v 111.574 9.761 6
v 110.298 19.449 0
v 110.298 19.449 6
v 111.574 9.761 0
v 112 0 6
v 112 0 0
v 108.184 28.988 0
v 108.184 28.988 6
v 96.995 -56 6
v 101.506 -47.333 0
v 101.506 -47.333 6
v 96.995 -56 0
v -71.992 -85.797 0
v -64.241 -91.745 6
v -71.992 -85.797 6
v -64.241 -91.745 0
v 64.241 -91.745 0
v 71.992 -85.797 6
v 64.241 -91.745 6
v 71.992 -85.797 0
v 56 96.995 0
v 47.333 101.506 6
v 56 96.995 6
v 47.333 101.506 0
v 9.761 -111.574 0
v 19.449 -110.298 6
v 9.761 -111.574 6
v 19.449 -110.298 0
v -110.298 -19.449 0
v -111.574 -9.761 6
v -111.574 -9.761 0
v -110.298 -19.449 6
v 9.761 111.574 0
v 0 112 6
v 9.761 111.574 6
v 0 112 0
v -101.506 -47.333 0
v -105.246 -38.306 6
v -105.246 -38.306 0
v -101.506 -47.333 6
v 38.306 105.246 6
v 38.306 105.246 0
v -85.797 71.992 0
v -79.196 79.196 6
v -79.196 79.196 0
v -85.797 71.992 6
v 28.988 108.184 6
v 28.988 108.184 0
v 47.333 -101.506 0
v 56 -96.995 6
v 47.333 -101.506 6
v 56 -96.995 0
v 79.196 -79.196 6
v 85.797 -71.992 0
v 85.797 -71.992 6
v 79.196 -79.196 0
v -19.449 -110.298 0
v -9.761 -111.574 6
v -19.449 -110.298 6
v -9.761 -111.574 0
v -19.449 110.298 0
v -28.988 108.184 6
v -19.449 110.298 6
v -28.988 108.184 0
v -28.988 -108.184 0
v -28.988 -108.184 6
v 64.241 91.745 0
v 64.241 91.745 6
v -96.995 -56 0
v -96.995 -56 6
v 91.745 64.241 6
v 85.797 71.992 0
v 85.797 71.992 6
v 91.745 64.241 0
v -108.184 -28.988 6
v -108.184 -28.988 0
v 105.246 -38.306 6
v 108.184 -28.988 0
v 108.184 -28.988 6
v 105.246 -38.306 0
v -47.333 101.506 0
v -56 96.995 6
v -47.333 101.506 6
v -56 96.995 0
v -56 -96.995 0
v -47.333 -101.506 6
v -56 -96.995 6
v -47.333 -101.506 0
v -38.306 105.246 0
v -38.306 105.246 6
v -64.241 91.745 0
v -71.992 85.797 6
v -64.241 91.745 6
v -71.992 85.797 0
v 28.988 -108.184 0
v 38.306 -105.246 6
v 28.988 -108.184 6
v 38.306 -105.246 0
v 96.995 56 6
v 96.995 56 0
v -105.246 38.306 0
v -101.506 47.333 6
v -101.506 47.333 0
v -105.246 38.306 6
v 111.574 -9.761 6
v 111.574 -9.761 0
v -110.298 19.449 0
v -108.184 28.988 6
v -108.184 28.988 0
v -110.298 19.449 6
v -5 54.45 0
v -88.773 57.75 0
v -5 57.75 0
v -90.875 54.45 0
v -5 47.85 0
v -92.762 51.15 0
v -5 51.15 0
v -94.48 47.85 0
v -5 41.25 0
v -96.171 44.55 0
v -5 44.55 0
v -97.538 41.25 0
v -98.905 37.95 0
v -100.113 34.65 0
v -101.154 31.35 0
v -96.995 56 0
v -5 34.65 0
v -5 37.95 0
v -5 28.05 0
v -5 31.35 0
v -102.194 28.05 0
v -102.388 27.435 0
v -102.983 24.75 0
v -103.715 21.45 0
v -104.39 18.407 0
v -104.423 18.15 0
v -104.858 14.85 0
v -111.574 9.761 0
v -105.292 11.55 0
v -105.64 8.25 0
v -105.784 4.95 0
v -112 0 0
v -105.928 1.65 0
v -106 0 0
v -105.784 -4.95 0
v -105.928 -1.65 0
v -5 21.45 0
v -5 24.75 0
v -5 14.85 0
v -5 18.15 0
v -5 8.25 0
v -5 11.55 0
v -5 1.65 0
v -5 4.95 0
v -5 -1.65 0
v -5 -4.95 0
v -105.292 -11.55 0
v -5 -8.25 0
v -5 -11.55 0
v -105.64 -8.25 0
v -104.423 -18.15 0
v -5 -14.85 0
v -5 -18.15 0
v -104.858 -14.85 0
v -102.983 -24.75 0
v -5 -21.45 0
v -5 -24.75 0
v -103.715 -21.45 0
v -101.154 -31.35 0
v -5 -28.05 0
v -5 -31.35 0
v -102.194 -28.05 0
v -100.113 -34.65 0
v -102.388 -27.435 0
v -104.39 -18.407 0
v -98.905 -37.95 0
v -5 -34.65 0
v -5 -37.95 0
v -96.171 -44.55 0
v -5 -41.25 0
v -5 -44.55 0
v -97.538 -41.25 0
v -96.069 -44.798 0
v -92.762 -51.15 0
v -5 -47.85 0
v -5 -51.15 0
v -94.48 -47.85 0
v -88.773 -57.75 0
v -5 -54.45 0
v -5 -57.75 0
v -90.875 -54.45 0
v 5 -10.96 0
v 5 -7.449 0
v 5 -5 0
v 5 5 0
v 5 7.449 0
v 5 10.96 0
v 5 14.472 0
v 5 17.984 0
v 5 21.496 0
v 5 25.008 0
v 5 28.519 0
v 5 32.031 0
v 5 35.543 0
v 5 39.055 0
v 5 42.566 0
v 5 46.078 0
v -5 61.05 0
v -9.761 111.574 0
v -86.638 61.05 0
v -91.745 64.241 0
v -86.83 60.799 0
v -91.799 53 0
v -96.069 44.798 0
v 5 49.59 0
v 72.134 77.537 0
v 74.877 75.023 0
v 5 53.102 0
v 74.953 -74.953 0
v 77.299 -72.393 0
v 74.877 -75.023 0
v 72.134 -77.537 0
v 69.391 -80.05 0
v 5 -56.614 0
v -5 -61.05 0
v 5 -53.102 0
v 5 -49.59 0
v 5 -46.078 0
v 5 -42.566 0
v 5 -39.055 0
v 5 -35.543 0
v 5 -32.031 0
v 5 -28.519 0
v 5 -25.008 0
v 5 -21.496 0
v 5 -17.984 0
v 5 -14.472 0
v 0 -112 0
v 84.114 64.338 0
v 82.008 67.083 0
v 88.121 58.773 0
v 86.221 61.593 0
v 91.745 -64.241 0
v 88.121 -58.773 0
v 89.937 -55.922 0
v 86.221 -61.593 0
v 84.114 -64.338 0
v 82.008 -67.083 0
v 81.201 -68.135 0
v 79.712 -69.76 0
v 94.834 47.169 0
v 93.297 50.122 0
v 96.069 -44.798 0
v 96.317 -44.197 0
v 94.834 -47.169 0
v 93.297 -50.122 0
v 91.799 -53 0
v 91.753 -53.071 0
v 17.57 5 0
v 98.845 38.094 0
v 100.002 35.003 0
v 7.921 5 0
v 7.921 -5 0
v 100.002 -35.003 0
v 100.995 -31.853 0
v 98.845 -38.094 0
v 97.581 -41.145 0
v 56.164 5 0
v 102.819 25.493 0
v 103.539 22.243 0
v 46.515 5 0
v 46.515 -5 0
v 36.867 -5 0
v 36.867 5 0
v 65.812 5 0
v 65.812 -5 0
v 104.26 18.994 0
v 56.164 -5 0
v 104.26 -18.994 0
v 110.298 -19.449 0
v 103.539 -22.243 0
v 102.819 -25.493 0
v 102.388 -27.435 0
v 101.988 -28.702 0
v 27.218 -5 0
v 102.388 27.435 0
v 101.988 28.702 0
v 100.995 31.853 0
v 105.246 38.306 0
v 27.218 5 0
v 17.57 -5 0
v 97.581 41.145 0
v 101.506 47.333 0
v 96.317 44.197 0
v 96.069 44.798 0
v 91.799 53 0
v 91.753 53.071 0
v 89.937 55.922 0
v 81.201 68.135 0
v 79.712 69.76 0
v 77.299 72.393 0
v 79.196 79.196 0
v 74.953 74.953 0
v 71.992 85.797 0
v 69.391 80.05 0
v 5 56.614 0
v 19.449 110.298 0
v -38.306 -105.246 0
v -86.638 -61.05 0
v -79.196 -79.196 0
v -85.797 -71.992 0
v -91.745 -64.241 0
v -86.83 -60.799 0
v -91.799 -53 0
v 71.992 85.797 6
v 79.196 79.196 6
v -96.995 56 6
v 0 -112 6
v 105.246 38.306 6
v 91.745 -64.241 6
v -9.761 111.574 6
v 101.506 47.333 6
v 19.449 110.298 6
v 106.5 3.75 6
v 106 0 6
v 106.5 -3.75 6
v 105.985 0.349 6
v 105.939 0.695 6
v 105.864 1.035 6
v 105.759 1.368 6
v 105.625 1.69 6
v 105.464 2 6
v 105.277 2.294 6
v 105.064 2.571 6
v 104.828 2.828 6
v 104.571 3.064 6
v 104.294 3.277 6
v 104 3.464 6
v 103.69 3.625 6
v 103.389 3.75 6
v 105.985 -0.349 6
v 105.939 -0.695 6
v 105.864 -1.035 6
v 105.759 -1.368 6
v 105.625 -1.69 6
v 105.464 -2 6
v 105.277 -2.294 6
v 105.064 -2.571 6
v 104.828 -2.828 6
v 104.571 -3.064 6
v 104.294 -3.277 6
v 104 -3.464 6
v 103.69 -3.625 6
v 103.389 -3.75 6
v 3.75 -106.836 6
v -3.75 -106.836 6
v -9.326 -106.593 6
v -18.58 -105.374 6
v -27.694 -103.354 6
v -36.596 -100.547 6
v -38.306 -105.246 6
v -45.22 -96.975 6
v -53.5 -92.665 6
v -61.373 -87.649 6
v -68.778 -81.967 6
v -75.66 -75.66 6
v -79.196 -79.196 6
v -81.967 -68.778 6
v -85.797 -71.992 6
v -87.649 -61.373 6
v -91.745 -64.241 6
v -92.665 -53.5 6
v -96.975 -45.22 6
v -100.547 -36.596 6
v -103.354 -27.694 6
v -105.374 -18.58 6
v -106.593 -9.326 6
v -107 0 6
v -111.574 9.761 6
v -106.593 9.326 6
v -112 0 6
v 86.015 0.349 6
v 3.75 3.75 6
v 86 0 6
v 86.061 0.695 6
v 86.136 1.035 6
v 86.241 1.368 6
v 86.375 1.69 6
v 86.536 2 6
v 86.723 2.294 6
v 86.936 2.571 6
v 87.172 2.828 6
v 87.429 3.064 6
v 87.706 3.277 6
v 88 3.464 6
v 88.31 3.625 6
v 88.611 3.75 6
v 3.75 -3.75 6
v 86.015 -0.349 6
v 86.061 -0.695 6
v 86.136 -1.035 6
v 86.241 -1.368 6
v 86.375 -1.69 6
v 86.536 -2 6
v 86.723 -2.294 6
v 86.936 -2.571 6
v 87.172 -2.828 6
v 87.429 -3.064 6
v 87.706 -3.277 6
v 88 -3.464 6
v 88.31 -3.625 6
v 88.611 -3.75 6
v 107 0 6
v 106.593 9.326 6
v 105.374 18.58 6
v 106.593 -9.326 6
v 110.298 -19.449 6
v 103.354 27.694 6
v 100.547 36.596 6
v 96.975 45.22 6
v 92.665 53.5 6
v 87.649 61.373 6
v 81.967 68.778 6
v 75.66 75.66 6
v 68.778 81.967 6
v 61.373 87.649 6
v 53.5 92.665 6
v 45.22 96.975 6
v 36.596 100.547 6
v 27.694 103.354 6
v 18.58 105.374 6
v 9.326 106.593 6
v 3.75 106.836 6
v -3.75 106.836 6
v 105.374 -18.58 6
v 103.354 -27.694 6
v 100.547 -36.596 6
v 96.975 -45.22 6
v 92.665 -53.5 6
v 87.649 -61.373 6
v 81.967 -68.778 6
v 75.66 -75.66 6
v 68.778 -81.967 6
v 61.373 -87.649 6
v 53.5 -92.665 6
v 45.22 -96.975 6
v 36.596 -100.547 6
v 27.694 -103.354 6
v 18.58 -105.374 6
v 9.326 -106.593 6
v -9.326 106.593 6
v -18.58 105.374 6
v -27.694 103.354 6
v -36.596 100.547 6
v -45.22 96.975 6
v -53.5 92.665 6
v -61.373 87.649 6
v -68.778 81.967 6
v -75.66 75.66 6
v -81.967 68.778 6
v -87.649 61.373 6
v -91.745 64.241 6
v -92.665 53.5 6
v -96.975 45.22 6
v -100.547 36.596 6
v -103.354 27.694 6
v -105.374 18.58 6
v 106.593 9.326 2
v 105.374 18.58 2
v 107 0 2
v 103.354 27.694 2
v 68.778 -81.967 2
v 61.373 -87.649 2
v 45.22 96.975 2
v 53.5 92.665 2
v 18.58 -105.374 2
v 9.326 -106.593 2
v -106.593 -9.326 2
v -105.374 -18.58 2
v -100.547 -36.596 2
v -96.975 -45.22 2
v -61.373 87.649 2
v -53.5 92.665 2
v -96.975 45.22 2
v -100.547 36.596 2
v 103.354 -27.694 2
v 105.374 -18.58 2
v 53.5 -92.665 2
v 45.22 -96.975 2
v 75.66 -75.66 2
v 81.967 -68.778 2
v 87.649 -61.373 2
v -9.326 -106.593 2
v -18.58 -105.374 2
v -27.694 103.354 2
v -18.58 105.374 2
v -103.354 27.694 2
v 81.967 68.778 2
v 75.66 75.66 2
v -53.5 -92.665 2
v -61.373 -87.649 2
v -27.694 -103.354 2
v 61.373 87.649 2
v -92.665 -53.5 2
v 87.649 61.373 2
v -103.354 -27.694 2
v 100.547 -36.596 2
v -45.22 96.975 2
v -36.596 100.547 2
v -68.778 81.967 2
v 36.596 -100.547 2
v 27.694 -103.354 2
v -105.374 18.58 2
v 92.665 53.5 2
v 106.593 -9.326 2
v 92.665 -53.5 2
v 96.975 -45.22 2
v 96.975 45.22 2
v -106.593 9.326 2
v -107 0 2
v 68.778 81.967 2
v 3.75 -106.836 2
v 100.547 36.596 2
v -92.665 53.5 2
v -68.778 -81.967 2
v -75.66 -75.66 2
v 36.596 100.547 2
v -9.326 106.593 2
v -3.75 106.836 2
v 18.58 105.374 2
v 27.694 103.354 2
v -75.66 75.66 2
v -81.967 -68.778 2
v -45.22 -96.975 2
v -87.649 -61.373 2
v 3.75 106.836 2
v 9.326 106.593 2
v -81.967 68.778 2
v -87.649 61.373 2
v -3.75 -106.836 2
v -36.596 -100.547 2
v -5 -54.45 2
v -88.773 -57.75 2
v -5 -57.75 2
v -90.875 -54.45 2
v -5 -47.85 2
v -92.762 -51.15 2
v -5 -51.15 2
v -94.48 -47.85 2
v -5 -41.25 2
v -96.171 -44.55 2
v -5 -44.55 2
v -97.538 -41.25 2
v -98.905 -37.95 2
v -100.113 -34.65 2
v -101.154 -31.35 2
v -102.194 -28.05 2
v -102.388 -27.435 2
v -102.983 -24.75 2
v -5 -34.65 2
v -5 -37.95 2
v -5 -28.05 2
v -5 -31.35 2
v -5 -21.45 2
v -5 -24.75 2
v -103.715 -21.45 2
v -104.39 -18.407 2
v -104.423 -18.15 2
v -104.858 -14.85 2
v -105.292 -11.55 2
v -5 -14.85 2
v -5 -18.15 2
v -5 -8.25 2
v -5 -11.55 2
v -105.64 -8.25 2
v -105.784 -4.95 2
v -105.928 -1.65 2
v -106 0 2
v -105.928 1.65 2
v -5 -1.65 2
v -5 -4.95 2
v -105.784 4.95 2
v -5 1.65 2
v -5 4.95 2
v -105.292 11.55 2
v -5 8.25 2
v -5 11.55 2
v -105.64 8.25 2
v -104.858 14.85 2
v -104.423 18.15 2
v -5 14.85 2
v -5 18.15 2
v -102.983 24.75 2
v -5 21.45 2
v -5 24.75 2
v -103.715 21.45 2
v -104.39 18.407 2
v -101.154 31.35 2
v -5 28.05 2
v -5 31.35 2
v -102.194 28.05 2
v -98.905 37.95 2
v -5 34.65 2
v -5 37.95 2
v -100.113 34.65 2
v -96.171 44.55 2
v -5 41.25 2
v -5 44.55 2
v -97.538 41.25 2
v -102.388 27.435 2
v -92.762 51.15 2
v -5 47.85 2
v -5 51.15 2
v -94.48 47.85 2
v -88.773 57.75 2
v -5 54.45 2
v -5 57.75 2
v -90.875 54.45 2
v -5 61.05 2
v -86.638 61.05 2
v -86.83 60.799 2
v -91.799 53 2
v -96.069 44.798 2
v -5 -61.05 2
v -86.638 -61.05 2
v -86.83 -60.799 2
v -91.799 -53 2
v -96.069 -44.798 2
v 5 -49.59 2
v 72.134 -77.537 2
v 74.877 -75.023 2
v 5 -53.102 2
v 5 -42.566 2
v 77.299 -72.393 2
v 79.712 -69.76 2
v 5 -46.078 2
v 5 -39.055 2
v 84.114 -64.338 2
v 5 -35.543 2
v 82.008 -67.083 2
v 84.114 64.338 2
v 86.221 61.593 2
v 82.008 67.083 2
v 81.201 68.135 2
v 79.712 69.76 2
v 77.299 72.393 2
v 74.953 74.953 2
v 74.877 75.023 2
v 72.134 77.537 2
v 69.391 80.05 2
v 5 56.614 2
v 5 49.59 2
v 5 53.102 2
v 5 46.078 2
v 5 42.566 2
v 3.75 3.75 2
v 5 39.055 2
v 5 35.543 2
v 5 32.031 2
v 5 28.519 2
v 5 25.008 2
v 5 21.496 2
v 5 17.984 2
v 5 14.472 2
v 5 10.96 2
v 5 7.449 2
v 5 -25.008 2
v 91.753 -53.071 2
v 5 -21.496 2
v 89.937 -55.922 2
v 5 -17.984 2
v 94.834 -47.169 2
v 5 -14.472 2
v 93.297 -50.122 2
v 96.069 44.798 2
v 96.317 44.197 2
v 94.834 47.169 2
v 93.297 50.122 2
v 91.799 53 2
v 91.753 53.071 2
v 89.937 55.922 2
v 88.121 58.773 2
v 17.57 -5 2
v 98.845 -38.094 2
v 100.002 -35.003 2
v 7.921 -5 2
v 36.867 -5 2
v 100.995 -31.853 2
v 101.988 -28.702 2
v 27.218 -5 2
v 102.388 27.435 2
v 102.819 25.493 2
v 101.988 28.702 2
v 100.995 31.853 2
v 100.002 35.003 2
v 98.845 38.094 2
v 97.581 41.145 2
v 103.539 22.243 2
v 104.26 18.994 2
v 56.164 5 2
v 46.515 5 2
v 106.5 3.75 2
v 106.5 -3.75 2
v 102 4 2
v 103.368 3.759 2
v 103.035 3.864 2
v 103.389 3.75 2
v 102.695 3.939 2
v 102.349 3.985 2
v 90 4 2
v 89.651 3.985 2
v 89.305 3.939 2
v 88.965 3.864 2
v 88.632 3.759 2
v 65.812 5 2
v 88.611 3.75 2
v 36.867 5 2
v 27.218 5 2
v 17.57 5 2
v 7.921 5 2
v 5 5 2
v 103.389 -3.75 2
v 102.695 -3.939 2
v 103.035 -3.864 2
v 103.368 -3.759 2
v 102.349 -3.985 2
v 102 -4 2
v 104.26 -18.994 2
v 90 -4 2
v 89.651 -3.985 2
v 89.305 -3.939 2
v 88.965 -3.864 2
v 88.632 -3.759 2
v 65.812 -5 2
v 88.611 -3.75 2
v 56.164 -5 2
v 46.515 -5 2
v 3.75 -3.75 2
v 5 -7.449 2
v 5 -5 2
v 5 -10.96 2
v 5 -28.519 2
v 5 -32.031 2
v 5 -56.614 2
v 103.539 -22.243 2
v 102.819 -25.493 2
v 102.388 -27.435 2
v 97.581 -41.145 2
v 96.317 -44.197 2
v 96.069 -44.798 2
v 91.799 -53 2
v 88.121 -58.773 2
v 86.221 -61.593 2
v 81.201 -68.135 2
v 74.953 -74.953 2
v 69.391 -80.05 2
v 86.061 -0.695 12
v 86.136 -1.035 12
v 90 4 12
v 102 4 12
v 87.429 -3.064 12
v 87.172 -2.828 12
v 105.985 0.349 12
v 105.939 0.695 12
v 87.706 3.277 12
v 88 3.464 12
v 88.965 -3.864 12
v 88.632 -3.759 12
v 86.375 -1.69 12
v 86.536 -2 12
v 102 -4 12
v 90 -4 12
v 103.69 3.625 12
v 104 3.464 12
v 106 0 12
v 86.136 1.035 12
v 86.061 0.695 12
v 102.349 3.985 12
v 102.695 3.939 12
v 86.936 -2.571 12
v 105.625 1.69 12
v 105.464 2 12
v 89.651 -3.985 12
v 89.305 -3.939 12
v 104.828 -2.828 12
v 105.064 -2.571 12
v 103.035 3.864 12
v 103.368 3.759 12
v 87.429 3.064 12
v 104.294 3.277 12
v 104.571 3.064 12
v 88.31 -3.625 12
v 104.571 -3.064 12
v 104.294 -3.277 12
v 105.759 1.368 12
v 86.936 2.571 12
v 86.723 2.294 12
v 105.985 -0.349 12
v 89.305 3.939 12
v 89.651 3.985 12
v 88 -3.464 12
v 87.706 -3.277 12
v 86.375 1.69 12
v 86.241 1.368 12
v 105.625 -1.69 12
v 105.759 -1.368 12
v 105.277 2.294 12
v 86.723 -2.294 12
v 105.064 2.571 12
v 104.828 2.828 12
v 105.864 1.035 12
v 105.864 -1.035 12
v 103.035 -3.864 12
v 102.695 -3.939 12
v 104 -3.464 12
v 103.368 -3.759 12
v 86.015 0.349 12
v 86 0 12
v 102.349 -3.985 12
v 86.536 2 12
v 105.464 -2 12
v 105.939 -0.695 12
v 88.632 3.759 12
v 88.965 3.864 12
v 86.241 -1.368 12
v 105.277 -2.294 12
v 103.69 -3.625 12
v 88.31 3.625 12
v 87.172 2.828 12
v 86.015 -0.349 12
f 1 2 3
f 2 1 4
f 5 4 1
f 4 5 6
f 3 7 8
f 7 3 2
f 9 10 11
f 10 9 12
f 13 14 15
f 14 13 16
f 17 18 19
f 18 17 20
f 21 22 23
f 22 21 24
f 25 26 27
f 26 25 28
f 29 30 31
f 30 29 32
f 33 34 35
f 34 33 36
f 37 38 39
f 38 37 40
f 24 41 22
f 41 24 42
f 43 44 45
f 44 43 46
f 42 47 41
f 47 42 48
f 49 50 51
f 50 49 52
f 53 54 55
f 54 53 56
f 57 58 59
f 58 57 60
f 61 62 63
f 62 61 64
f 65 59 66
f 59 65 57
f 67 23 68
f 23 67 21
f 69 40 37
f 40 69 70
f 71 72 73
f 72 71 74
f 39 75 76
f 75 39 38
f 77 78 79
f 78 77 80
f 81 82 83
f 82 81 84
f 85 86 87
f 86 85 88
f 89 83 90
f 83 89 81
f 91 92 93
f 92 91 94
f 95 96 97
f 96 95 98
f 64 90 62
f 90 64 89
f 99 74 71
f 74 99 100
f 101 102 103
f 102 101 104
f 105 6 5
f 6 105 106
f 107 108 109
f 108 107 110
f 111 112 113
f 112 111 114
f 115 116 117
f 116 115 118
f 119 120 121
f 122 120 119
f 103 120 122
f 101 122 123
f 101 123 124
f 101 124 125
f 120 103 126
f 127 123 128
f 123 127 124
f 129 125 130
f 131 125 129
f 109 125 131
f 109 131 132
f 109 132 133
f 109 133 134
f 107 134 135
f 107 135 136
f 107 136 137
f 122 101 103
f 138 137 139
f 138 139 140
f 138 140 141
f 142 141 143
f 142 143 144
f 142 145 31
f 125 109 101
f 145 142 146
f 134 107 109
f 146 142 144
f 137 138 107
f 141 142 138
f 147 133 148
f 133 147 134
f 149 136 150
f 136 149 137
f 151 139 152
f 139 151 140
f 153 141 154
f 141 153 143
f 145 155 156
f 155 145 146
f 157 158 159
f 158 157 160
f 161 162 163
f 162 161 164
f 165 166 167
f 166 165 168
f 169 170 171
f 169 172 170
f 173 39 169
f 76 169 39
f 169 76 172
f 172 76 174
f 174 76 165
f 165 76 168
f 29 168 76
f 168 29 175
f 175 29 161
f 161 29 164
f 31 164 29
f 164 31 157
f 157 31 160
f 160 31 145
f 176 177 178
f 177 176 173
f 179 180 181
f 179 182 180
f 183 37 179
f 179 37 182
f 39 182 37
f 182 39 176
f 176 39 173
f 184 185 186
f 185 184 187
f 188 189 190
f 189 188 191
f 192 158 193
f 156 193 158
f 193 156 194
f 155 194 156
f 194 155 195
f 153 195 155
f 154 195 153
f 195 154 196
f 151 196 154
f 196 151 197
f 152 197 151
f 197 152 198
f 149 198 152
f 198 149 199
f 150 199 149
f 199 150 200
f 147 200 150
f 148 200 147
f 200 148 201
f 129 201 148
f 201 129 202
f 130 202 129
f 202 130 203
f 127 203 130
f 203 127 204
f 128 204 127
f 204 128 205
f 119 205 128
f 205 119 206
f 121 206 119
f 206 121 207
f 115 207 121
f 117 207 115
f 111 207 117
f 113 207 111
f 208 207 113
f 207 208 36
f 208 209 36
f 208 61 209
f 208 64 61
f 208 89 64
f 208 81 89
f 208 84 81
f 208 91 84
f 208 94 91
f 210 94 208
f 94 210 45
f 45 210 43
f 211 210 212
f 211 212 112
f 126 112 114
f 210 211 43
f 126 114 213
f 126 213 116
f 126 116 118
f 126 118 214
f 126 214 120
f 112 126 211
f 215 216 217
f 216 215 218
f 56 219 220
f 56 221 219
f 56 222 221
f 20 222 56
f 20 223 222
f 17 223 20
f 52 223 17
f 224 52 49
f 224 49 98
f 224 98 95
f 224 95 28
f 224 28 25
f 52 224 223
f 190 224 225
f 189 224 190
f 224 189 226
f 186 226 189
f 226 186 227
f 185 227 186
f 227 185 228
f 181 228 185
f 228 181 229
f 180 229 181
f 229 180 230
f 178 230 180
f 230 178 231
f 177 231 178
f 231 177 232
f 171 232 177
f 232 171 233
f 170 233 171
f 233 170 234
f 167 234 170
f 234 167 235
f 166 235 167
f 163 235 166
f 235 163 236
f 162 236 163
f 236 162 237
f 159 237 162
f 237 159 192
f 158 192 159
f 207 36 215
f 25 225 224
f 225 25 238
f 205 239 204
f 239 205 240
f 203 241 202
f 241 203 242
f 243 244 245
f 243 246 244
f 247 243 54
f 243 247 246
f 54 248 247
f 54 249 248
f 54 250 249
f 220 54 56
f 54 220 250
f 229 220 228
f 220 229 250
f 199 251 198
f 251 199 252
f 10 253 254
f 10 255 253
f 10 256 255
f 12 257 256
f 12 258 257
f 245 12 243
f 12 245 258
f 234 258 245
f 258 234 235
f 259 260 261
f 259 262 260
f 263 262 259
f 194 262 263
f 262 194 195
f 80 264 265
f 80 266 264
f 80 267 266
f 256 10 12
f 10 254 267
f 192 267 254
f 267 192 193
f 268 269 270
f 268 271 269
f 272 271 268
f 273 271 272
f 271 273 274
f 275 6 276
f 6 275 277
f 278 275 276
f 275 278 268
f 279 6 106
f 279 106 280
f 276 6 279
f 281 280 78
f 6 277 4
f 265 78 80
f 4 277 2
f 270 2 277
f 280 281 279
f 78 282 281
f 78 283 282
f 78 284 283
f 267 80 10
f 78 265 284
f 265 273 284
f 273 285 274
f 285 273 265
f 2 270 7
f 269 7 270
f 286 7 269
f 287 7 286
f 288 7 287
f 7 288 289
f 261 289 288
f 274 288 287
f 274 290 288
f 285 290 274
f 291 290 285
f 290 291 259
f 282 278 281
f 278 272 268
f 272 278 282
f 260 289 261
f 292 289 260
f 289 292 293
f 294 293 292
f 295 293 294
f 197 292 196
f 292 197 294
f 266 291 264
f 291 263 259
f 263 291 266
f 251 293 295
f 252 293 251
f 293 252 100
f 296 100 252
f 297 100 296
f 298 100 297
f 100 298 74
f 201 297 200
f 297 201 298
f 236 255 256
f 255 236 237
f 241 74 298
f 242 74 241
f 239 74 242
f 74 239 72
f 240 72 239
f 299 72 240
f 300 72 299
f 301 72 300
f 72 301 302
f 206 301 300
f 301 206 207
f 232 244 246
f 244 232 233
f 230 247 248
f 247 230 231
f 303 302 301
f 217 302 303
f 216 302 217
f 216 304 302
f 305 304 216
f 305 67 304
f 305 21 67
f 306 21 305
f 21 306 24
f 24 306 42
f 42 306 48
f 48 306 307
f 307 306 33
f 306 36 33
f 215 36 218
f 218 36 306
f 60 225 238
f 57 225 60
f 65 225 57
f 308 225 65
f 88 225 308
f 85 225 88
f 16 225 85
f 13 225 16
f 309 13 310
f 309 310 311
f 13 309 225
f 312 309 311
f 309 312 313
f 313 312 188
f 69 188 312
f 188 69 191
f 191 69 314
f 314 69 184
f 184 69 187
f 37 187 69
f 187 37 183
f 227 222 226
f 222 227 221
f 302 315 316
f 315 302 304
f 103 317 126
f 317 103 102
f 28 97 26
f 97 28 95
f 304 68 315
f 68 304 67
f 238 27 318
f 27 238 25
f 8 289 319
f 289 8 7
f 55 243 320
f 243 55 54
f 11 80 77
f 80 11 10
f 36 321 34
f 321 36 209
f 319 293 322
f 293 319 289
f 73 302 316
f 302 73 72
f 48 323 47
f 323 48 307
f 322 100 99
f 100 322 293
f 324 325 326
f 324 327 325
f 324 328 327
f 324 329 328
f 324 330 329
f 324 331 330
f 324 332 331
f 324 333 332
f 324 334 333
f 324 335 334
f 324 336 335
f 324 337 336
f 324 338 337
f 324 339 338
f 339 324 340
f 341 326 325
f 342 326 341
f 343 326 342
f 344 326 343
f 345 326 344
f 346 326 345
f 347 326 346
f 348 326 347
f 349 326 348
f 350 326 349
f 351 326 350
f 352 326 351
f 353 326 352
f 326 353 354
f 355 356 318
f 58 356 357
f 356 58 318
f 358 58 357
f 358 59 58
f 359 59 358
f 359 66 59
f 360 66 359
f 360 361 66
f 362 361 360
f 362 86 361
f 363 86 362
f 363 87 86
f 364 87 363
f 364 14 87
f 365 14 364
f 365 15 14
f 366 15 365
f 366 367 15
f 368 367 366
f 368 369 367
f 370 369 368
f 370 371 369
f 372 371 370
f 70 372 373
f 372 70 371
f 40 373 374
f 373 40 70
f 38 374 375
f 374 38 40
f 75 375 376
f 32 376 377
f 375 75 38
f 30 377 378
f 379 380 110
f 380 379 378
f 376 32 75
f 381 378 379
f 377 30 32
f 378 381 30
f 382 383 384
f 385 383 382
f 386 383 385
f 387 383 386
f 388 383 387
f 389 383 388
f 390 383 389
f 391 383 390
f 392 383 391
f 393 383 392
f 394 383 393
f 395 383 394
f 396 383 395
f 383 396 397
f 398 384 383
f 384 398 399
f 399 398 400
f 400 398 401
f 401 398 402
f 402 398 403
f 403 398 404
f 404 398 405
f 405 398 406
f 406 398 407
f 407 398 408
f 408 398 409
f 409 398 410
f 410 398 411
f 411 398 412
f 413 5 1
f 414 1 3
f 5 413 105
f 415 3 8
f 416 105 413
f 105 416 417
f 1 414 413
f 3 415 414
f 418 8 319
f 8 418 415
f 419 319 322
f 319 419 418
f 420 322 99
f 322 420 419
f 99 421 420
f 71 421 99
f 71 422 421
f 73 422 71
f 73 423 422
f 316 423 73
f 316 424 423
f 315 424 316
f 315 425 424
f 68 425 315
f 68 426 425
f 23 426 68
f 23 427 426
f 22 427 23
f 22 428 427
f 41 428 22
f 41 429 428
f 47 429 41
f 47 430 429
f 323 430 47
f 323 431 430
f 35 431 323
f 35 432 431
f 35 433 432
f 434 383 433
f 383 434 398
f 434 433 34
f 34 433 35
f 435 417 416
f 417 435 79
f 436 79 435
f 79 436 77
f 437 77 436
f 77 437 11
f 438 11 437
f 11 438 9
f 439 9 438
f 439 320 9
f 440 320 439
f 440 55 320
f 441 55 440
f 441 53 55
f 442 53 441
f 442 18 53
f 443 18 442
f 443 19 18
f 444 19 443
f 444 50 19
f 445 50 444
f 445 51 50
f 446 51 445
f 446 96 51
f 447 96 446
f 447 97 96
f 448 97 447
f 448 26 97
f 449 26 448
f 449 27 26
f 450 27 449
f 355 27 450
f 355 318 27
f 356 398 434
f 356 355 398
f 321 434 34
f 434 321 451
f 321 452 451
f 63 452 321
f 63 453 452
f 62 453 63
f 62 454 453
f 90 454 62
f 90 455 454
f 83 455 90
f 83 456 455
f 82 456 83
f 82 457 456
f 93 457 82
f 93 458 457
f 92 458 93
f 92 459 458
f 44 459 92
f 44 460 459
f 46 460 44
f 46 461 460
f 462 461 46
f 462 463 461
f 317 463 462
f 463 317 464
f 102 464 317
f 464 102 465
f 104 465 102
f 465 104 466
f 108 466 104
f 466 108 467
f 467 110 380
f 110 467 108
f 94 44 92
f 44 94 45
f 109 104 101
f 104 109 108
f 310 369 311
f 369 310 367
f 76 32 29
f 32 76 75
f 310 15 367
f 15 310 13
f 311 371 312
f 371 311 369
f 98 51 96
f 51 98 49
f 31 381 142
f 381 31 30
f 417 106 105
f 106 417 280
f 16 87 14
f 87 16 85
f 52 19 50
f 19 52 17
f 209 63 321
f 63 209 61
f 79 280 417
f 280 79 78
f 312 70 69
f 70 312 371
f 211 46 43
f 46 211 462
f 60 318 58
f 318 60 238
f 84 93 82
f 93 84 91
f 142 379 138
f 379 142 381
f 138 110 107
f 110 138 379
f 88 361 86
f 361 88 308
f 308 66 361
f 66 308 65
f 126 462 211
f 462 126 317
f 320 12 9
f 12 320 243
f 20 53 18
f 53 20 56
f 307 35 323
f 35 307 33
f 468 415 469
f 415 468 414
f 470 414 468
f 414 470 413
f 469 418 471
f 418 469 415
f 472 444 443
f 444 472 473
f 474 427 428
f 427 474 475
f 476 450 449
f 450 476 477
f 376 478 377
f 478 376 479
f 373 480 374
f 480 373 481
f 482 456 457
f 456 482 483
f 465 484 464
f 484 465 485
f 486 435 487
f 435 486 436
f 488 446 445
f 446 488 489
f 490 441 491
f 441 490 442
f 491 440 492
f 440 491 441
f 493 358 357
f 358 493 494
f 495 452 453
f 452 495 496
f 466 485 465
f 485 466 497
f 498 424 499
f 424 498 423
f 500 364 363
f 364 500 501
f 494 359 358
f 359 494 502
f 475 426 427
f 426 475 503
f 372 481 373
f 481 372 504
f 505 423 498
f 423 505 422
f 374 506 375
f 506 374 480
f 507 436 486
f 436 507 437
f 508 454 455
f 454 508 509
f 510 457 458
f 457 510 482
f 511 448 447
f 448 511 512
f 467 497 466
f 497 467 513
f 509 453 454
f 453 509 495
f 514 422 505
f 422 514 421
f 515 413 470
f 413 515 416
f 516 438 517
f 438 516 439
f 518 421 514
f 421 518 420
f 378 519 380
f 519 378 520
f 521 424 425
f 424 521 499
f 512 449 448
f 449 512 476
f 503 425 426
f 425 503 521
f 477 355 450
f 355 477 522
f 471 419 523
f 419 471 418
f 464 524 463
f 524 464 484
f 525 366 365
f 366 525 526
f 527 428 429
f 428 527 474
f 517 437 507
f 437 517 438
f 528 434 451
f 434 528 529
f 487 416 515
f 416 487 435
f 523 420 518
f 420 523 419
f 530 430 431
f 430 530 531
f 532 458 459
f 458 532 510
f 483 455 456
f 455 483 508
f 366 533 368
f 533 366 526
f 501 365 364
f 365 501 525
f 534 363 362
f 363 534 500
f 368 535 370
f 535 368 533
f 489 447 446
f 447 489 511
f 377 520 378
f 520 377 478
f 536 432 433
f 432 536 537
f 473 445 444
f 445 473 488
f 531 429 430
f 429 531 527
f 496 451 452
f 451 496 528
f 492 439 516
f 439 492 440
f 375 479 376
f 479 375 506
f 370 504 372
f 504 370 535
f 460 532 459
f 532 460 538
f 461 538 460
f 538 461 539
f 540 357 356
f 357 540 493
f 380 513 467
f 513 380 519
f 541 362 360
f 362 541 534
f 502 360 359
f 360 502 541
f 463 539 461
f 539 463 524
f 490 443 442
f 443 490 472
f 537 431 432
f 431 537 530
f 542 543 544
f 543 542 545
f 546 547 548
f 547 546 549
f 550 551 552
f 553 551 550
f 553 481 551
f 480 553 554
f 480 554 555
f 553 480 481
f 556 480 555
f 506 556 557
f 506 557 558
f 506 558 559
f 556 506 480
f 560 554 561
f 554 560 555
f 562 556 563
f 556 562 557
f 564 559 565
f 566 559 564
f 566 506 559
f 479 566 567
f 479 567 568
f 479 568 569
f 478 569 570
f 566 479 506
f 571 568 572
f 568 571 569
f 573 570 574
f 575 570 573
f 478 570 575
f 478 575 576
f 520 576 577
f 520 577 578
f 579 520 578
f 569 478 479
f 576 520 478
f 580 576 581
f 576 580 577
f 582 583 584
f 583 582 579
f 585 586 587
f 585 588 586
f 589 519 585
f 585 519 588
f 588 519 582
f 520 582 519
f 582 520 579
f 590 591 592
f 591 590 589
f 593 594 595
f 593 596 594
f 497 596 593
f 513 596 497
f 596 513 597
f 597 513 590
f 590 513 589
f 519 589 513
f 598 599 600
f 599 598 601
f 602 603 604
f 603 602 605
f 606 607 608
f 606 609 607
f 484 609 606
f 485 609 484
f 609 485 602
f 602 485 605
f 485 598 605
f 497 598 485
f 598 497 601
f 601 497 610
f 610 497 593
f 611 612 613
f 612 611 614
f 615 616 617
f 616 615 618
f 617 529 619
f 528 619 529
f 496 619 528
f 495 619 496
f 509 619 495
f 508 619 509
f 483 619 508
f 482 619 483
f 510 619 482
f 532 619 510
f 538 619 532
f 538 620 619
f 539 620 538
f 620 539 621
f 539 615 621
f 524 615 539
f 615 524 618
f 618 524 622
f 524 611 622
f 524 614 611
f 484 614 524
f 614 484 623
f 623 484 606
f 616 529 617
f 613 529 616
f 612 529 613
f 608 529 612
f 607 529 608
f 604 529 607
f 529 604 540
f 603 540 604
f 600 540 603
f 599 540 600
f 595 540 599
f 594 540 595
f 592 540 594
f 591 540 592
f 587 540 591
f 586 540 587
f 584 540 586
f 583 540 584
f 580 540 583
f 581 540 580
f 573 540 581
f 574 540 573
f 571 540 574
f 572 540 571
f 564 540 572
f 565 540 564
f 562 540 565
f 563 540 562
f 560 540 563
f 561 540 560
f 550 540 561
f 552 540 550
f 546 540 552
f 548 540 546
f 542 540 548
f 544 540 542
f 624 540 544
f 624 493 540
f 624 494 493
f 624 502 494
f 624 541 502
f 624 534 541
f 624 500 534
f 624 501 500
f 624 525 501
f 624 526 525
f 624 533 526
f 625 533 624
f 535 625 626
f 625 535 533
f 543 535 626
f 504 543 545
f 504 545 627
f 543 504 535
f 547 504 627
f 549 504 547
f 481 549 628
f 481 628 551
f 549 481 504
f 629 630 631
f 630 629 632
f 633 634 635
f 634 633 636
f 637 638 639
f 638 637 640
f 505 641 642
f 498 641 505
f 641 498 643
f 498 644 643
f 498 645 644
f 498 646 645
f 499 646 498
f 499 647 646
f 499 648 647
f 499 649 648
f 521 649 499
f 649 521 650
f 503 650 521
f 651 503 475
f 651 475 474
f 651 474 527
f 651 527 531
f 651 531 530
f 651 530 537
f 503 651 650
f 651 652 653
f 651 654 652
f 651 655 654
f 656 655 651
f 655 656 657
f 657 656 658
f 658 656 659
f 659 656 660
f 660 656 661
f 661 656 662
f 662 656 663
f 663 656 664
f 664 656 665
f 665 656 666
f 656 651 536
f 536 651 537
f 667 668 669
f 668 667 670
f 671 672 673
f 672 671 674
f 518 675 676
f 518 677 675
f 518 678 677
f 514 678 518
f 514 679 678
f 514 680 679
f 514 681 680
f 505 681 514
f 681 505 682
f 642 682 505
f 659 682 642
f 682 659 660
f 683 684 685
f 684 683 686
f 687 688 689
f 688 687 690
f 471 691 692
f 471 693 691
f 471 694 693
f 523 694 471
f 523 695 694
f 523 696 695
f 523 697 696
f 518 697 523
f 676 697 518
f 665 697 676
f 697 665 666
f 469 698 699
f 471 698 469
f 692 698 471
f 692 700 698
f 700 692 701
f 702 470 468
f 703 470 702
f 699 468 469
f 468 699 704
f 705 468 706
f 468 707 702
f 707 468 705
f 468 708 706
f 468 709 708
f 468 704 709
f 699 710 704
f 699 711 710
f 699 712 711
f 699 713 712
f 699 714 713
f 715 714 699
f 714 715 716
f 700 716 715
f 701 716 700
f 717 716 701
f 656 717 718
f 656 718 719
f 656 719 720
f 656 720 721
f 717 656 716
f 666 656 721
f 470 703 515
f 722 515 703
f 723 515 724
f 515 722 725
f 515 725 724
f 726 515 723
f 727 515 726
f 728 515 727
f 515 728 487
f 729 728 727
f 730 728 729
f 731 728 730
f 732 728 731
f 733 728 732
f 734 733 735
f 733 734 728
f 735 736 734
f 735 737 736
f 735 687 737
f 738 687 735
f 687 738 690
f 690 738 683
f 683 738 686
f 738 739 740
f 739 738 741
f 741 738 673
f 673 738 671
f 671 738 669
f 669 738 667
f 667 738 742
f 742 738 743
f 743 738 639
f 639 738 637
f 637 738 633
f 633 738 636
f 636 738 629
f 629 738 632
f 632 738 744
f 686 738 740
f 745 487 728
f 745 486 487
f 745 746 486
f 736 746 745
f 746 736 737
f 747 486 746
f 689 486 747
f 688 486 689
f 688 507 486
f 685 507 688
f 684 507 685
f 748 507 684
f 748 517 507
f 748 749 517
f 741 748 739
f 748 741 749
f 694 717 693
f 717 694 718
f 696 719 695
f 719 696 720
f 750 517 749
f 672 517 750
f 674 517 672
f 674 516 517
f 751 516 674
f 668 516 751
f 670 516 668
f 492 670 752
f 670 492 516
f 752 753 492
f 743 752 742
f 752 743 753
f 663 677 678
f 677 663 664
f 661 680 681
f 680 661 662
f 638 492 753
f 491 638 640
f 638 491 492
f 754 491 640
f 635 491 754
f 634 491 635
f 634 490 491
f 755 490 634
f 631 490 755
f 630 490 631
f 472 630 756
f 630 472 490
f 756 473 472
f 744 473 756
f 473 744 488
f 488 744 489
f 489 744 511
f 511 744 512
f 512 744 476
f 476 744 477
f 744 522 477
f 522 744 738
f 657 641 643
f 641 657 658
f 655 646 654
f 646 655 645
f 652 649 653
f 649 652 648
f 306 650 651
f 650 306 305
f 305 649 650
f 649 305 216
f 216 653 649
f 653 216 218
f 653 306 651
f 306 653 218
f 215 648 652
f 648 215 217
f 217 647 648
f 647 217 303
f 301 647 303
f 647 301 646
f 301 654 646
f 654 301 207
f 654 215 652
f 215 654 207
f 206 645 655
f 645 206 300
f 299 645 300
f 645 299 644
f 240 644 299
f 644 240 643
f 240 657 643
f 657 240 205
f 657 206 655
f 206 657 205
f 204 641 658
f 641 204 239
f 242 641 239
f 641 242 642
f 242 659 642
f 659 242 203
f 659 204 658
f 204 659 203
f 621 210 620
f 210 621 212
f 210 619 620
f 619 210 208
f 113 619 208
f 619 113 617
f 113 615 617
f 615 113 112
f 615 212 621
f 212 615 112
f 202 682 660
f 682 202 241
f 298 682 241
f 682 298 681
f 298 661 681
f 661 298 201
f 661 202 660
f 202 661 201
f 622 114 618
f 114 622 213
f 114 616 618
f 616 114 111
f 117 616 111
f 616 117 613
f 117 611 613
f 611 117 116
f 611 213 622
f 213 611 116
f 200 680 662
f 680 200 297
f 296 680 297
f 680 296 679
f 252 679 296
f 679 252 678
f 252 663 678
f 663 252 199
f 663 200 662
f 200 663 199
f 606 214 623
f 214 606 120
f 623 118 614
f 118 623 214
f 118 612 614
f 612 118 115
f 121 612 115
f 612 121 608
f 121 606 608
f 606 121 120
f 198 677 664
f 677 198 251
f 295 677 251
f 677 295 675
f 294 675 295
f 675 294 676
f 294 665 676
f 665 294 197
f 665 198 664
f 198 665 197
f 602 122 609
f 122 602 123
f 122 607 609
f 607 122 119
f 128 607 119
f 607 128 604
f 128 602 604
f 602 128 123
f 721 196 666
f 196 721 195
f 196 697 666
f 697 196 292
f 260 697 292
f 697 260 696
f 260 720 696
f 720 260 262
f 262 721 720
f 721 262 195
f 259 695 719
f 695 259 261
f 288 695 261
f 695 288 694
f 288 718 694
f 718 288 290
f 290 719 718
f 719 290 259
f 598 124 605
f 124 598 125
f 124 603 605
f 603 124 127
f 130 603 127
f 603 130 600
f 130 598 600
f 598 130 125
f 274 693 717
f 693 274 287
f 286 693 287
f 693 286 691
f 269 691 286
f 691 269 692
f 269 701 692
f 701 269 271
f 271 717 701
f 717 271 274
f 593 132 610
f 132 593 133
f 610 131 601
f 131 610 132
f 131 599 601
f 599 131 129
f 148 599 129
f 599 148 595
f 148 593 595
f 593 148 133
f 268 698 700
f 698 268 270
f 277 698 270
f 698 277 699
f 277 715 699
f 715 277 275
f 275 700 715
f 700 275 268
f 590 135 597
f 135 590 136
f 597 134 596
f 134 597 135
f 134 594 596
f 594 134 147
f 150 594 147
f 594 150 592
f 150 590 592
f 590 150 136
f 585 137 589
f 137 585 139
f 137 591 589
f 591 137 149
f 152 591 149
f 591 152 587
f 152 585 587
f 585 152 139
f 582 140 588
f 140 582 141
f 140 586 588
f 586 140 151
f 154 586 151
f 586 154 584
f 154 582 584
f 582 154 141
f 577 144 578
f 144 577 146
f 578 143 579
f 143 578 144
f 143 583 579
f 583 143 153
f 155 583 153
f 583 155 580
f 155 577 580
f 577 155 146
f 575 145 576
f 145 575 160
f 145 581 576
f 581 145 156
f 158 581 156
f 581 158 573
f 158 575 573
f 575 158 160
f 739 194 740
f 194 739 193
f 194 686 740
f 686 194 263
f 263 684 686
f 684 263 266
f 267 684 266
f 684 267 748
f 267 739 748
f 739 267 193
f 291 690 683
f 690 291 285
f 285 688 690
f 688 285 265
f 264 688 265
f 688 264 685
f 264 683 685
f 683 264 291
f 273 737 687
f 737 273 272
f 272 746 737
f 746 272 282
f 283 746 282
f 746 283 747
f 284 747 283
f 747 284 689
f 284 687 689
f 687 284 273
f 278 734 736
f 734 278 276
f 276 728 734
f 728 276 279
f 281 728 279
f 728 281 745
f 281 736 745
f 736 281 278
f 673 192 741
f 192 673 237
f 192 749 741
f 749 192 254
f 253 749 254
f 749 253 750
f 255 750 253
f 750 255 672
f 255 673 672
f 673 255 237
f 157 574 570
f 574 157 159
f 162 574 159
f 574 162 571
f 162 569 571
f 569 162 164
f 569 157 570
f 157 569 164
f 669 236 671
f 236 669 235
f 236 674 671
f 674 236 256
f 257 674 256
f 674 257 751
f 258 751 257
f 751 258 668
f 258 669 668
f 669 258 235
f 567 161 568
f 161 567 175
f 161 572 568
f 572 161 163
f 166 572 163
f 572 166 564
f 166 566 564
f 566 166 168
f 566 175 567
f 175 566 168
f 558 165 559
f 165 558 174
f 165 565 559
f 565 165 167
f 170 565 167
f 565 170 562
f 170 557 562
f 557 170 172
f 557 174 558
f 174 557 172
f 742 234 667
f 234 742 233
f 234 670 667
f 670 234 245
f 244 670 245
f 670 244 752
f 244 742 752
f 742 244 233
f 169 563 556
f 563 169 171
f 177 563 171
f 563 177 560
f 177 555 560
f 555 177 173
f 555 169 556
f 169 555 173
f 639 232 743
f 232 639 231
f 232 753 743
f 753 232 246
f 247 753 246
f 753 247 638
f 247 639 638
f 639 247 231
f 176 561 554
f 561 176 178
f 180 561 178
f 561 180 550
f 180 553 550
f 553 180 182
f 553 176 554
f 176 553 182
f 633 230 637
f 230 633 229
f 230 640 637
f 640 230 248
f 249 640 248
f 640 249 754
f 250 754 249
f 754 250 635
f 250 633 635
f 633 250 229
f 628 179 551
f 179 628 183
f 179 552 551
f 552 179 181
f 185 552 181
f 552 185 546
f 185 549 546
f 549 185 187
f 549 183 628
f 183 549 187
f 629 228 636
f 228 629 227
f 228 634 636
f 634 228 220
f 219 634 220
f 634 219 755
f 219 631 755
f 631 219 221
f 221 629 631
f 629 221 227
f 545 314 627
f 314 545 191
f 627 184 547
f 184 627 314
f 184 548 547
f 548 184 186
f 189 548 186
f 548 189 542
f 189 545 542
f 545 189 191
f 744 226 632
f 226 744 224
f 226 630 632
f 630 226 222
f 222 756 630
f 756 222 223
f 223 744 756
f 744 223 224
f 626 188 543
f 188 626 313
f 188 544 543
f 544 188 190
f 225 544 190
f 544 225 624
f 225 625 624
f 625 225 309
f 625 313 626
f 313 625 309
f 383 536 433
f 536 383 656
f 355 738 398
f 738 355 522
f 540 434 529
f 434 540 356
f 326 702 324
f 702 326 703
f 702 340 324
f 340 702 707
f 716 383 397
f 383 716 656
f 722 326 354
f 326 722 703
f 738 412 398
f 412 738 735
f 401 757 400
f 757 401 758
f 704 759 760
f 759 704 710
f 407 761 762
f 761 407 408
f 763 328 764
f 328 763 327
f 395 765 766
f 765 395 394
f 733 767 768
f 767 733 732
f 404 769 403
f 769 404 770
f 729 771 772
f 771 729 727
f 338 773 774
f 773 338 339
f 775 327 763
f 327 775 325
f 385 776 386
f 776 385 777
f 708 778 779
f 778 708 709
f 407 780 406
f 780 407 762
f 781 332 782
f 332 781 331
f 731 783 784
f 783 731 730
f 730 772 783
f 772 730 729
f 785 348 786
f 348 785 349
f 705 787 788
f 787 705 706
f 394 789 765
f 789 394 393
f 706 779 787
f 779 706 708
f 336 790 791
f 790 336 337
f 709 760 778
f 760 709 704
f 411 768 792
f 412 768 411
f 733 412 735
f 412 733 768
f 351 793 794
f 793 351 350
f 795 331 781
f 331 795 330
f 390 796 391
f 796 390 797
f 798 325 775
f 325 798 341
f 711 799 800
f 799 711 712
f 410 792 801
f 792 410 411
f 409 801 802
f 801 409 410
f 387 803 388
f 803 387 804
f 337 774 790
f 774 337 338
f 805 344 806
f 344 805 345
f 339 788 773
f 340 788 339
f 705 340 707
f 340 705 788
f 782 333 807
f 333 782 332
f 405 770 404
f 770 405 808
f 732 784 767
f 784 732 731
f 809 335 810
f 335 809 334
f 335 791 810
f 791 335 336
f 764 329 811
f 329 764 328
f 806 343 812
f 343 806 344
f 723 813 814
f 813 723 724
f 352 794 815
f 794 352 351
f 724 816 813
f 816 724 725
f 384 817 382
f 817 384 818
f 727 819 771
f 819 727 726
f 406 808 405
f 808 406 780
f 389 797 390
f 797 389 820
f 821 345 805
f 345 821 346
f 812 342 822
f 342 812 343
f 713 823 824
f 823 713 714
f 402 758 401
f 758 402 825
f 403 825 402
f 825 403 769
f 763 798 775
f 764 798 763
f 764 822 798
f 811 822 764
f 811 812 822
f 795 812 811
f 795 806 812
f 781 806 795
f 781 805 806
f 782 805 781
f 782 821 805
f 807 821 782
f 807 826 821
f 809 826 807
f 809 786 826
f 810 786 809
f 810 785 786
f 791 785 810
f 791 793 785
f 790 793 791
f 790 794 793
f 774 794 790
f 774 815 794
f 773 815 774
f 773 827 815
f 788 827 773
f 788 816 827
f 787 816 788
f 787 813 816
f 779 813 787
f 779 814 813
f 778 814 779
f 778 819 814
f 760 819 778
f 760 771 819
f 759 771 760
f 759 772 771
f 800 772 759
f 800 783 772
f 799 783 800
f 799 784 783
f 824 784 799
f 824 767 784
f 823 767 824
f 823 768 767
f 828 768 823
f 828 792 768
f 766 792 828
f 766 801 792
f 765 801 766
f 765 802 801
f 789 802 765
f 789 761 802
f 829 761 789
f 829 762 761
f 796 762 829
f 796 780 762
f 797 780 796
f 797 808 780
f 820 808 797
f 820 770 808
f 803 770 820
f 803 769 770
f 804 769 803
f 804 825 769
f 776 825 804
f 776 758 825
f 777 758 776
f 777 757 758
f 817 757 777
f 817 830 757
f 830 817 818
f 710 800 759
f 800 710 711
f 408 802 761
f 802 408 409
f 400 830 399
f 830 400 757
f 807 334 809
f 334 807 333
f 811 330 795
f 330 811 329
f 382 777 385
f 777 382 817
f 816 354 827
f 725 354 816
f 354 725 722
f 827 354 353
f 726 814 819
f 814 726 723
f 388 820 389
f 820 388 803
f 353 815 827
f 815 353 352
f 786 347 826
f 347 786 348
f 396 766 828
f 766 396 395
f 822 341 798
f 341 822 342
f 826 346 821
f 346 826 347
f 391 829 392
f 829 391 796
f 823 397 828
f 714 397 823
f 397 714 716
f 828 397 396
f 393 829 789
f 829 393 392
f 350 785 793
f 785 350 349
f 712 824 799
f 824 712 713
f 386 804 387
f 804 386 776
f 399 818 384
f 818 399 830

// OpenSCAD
/*                                                 -*- c++ -*-
 * A Bahtinov mask generator.
 * Units in mm, default values are for
 * an 8 inch Newtonian
 *
 * Copyright 2013-2014, Brent Burton
 * License: CC-BY-SA
 *
 * Based on version updated: 2014-06-23
 *
 * Further modifications by Egil Kvaleberg
 * Latest update: 2014-01-26
 */

// Number of sections to split the mask in
sections = 0; // [1,2,4]

// Print which section, max is sections-1
section = 0; // [0,1,2,3]

// The overall diameter of the mask.
outerDiameter = 224.0; //

// The telescope light path diameter.
aperture = 212.0; // should be less than outerDiameter

// Diameter of secondary mirror holder. If no secondary, set to 0.
centerHoleDiameter = 0; // 

// Width of the bars.
gap = 3.3; // 3.3 is for 1000mm focal length; 4.0 for 1200mm; 6.0 for 2000mm

// Angle of bars
angle = 20; // 20 degrees is the standard value

// Maximum number of bars
maxBars = 10; // 

// Width of the strengthening bars.
bar = 10.0; 

// Height of gap mask
mHeight = 2.0;  // 

// Height of strengthening bars
bHeight = 6.0; // 

// Extra air needed between sections (times two) 
tol = 0.25; // Depends on the accuracy of your printer

d = 1 * 0.01;

/* create a series of bars covering roughly one half of the
 * scope aperture. Located in the +X side.
 */
module bars(gap, width, num=5) {
    num = round(num);
    for (i=[-num:num]) {
        translate([width/2,i*2*gap]) square([width,gap], center=true);
    }
}

module bahtinovBars(gap,width) {
    numBars = min(maxBars-1, aperture/2 / gap / 2 -1);
    // +X +Y bars
    intersection() {
        translate([0, outerDiameter*.08, 0]) rotate([0,0,angle]) bars(gap, width, numBars/2);
        square([outerDiameter/2, outerDiameter/2], center=false);
    }
    // +X -Y bars
    intersection() {
        translate([0, -outerDiameter*.08, 0]) rotate([0,0,-angle]) bars(gap, width, numBars/2);
        translate([0,-outerDiameter/2]) square([outerDiameter/2, outerDiameter/2], center=false);
    }
    // -X bars 
    rotate([0,0,180]) {
		if (sections<=2) bars(gap, width, numBars);
		else translate([0,gap,0]) bars(gap, width, numBars+1); 	 // offset so there is a solid bar in the middle
	}
}

$fn=72;
module bahtinov2D() {
    width = aperture/2;

    union() {
        difference() {                  // trims the mask to aperture size
            circle(r=aperture/2+1);
            bahtinovBars(gap,width);
        }
        difference() {                  // makes the outer margin
            circle(r=outerDiameter/2-1);
            circle(r=aperture/2);
        }
        // Add horizontal and vertical structural bars:
		  square([bar,2*(aperture/2+1)], center=true);

        if (sections==4) square([2*(aperture/2+1),bar], center=true);
		  else translate([aperture/4,0]) square([aperture/2+1,bar], center=true);
        // Add center hole margin if needed:
        if (centerHoleDiameter > 0 && centerHoleDiameter < outerDiameter) {
            circle(r=(centerHoleDiameter)/2+gap);
        }
    }
}

module bahtinov() {
   difference() {                          // overall plate minus center hole	
		union() {
	   		linear_extrude(height=mHeight) bahtinov2D();
			// Add strengthening bars
	       difference() {
	          cylinder(r=outerDiameter/2, h=bHeight);
	          translate([0,0,-d]) cylinder(r=aperture/2+1, h=bHeight+2*d);
	       }
	       // Add horizontal and vertical structural bars:
	       translate([0,0,bHeight/2]) 
				cube([bar*.75,2*(aperture/2+1),bHeight], center=true);
	       if (sections==4) translate([0,0,bHeight/2]) 
				cube([2*(aperture/2+1),bar*.75,bHeight], center=true);
			else translate([aperture/4,0,bHeight/2]) 
				cube([aperture/2+1,bar*.75,bHeight], center=true);
	
	  		// Add a little handle
	    	translate([outerDiameter/2-bar,0,0]) hull () {
				cylinder(r=bar*.4, h=12);
				translate([-12,0,0]) cylinder(r=bar*.4, h=12);
			}
		}
      // subtract center hole if needed
      if (centerHoleDiameter > 0 && centerHoleDiameter < outerDiameter) {
          translate([0,0,-0.1]) cylinder(r=centerHoleDiameter/2+1, h=bHeight+0.2);
      }
   }
}

// create the outline that defines the cut between sections 
module section() {
 	// the factor 20 can be tuned
	step = (outerDiameter-centerHoleDiameter-bar)/20;

	if (sections==2) translate([bar/4+tol, -outerDiameter/2, 0])
		cube([outerDiameter/2, outerDiameter, mHeight+12]);
	else translate([bar/4+tol, bar/4+tol, 0])
		cube([outerDiameter/2, outerDiameter/2, mHeight+12]);
	rotate ([0,0,(sections==2)?-90:0]) {
		for (x=[centerHoleDiameter/2+bar/2:2*step:outerDiameter/2-step]) {
			translate([x,-bar/8,0]) 
				hull () {
					cylinder(r=bar/8-tol, h=mHeight+12);
					translate([step,0,0]) cylinder(r=bar/8-tol, h=mHeight+12);
				}
			difference () {
				translate([x,-tol,0]) cube([step, bar/4+2*tol, mHeight+12]);
				translate([x,bar/8,-d]) { 
					cylinder(r=bar/8+tol, h=mHeight+12+2*d);
	 				translate([step,0,0]) cylinder(r=bar/8+tol, h=mHeight+12+2*d);
				}
			}
		}
		// filler at start
		translate([centerHoleDiameter/2+tol+((centerHoleDiameter>0 || sections==2 || section==0 || section==2)? 0: bar/4),-bar/4+tol,0]) cube([step, bar/2, mHeight+12]);
	}

	for (y=[centerHoleDiameter/2+bar/2+step:2*step:outerDiameter/2-step]) {
		translate([-bar/8,y,0]) 
			hull () {
				cylinder(r=bar/8-tol, h=mHeight+12);
				translate([0,step,0]) cylinder(r=bar/8-tol, h=mHeight+12);
			}
		difference () {
			translate([-tol,y,0]) cube([bar/4+2*tol, step, mHeight+12]);
			translate([bar/8,y,-d]) { 
				cylinder(r=bar/8+tol, h=mHeight+12+2*d);
 				translate([0,step,0]) cylinder(r=bar/8+tol, h=mHeight+12+2*d);
			}
		}
	}
	// filler at end
	translate([-bar/4+tol,outerDiameter/2-bar/2,0]) cube([bar/2, step, mHeight+12]);
}
	
px = (360 / sections) * section;
qx = (sections == 2) ? 90 + 45 : 0;

if (sections > 1) {
	rotate([0, 0, qx]) intersection () {
		bahtinov();	
		rotate([0, 0, px]) section();
	}
} else {
	bahtinov();	
}
